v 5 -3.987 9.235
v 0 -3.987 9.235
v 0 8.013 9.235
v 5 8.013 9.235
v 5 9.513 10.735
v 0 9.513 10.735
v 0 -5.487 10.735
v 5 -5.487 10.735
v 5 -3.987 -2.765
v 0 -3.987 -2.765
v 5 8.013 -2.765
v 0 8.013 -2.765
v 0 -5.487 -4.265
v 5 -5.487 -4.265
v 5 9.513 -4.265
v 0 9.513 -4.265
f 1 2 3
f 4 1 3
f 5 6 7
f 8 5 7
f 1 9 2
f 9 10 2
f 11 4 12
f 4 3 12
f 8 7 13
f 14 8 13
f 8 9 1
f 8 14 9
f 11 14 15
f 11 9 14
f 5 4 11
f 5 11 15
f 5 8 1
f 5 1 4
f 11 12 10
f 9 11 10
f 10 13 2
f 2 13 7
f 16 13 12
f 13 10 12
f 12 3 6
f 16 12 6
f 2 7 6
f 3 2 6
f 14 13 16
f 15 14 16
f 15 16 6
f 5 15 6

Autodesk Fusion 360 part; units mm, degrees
sketch "Sketch1" plane through (0, 0, 0) normal (1, 0, 0) x (0, 1, 0)
  line L0 (9.5131, 10.735) -> (-5.4869, 10.735)
  line L1 (-5.4869, 10.735) -> (-5.4869, -4.265)
  line L2 (-5.4869, -4.265) -> (9.5131, -4.265)
  line L3 (9.5131, -4.265) -> (9.5131, 10.735)
  line L4 (9.5131, 10.735) -> (-5.4869, -4.265) construction
  line L5 (-5.4869, 10.735) -> (9.5131, -4.265) construction
  line L6 (8.0131, -2.765) -> (-3.9869, -2.765)
  line L7 (-3.9869, -2.765) -> (-3.9869, 9.235)
  line L8 (-3.9869, 9.235) -> (8.0131, 9.235)
  line L9 (8.0131, 9.235) -> (8.0131, -2.765)
  line L10 (8.0131, -2.765) -> (-3.9869, 9.235) construction
  line L11 (-3.9869, -2.765) -> (8.0131, 9.235) construction
  point P0 (2.0131, 3.235)
  point P1 (2.0131, 3.235)
  dimension "d3" = 15
  dimension "d4" = 15
  dimension "d5" = 12
  dimension "d6" = 12
extrude "Extrude1" add sketch "Sketch1" along normal blind 5
